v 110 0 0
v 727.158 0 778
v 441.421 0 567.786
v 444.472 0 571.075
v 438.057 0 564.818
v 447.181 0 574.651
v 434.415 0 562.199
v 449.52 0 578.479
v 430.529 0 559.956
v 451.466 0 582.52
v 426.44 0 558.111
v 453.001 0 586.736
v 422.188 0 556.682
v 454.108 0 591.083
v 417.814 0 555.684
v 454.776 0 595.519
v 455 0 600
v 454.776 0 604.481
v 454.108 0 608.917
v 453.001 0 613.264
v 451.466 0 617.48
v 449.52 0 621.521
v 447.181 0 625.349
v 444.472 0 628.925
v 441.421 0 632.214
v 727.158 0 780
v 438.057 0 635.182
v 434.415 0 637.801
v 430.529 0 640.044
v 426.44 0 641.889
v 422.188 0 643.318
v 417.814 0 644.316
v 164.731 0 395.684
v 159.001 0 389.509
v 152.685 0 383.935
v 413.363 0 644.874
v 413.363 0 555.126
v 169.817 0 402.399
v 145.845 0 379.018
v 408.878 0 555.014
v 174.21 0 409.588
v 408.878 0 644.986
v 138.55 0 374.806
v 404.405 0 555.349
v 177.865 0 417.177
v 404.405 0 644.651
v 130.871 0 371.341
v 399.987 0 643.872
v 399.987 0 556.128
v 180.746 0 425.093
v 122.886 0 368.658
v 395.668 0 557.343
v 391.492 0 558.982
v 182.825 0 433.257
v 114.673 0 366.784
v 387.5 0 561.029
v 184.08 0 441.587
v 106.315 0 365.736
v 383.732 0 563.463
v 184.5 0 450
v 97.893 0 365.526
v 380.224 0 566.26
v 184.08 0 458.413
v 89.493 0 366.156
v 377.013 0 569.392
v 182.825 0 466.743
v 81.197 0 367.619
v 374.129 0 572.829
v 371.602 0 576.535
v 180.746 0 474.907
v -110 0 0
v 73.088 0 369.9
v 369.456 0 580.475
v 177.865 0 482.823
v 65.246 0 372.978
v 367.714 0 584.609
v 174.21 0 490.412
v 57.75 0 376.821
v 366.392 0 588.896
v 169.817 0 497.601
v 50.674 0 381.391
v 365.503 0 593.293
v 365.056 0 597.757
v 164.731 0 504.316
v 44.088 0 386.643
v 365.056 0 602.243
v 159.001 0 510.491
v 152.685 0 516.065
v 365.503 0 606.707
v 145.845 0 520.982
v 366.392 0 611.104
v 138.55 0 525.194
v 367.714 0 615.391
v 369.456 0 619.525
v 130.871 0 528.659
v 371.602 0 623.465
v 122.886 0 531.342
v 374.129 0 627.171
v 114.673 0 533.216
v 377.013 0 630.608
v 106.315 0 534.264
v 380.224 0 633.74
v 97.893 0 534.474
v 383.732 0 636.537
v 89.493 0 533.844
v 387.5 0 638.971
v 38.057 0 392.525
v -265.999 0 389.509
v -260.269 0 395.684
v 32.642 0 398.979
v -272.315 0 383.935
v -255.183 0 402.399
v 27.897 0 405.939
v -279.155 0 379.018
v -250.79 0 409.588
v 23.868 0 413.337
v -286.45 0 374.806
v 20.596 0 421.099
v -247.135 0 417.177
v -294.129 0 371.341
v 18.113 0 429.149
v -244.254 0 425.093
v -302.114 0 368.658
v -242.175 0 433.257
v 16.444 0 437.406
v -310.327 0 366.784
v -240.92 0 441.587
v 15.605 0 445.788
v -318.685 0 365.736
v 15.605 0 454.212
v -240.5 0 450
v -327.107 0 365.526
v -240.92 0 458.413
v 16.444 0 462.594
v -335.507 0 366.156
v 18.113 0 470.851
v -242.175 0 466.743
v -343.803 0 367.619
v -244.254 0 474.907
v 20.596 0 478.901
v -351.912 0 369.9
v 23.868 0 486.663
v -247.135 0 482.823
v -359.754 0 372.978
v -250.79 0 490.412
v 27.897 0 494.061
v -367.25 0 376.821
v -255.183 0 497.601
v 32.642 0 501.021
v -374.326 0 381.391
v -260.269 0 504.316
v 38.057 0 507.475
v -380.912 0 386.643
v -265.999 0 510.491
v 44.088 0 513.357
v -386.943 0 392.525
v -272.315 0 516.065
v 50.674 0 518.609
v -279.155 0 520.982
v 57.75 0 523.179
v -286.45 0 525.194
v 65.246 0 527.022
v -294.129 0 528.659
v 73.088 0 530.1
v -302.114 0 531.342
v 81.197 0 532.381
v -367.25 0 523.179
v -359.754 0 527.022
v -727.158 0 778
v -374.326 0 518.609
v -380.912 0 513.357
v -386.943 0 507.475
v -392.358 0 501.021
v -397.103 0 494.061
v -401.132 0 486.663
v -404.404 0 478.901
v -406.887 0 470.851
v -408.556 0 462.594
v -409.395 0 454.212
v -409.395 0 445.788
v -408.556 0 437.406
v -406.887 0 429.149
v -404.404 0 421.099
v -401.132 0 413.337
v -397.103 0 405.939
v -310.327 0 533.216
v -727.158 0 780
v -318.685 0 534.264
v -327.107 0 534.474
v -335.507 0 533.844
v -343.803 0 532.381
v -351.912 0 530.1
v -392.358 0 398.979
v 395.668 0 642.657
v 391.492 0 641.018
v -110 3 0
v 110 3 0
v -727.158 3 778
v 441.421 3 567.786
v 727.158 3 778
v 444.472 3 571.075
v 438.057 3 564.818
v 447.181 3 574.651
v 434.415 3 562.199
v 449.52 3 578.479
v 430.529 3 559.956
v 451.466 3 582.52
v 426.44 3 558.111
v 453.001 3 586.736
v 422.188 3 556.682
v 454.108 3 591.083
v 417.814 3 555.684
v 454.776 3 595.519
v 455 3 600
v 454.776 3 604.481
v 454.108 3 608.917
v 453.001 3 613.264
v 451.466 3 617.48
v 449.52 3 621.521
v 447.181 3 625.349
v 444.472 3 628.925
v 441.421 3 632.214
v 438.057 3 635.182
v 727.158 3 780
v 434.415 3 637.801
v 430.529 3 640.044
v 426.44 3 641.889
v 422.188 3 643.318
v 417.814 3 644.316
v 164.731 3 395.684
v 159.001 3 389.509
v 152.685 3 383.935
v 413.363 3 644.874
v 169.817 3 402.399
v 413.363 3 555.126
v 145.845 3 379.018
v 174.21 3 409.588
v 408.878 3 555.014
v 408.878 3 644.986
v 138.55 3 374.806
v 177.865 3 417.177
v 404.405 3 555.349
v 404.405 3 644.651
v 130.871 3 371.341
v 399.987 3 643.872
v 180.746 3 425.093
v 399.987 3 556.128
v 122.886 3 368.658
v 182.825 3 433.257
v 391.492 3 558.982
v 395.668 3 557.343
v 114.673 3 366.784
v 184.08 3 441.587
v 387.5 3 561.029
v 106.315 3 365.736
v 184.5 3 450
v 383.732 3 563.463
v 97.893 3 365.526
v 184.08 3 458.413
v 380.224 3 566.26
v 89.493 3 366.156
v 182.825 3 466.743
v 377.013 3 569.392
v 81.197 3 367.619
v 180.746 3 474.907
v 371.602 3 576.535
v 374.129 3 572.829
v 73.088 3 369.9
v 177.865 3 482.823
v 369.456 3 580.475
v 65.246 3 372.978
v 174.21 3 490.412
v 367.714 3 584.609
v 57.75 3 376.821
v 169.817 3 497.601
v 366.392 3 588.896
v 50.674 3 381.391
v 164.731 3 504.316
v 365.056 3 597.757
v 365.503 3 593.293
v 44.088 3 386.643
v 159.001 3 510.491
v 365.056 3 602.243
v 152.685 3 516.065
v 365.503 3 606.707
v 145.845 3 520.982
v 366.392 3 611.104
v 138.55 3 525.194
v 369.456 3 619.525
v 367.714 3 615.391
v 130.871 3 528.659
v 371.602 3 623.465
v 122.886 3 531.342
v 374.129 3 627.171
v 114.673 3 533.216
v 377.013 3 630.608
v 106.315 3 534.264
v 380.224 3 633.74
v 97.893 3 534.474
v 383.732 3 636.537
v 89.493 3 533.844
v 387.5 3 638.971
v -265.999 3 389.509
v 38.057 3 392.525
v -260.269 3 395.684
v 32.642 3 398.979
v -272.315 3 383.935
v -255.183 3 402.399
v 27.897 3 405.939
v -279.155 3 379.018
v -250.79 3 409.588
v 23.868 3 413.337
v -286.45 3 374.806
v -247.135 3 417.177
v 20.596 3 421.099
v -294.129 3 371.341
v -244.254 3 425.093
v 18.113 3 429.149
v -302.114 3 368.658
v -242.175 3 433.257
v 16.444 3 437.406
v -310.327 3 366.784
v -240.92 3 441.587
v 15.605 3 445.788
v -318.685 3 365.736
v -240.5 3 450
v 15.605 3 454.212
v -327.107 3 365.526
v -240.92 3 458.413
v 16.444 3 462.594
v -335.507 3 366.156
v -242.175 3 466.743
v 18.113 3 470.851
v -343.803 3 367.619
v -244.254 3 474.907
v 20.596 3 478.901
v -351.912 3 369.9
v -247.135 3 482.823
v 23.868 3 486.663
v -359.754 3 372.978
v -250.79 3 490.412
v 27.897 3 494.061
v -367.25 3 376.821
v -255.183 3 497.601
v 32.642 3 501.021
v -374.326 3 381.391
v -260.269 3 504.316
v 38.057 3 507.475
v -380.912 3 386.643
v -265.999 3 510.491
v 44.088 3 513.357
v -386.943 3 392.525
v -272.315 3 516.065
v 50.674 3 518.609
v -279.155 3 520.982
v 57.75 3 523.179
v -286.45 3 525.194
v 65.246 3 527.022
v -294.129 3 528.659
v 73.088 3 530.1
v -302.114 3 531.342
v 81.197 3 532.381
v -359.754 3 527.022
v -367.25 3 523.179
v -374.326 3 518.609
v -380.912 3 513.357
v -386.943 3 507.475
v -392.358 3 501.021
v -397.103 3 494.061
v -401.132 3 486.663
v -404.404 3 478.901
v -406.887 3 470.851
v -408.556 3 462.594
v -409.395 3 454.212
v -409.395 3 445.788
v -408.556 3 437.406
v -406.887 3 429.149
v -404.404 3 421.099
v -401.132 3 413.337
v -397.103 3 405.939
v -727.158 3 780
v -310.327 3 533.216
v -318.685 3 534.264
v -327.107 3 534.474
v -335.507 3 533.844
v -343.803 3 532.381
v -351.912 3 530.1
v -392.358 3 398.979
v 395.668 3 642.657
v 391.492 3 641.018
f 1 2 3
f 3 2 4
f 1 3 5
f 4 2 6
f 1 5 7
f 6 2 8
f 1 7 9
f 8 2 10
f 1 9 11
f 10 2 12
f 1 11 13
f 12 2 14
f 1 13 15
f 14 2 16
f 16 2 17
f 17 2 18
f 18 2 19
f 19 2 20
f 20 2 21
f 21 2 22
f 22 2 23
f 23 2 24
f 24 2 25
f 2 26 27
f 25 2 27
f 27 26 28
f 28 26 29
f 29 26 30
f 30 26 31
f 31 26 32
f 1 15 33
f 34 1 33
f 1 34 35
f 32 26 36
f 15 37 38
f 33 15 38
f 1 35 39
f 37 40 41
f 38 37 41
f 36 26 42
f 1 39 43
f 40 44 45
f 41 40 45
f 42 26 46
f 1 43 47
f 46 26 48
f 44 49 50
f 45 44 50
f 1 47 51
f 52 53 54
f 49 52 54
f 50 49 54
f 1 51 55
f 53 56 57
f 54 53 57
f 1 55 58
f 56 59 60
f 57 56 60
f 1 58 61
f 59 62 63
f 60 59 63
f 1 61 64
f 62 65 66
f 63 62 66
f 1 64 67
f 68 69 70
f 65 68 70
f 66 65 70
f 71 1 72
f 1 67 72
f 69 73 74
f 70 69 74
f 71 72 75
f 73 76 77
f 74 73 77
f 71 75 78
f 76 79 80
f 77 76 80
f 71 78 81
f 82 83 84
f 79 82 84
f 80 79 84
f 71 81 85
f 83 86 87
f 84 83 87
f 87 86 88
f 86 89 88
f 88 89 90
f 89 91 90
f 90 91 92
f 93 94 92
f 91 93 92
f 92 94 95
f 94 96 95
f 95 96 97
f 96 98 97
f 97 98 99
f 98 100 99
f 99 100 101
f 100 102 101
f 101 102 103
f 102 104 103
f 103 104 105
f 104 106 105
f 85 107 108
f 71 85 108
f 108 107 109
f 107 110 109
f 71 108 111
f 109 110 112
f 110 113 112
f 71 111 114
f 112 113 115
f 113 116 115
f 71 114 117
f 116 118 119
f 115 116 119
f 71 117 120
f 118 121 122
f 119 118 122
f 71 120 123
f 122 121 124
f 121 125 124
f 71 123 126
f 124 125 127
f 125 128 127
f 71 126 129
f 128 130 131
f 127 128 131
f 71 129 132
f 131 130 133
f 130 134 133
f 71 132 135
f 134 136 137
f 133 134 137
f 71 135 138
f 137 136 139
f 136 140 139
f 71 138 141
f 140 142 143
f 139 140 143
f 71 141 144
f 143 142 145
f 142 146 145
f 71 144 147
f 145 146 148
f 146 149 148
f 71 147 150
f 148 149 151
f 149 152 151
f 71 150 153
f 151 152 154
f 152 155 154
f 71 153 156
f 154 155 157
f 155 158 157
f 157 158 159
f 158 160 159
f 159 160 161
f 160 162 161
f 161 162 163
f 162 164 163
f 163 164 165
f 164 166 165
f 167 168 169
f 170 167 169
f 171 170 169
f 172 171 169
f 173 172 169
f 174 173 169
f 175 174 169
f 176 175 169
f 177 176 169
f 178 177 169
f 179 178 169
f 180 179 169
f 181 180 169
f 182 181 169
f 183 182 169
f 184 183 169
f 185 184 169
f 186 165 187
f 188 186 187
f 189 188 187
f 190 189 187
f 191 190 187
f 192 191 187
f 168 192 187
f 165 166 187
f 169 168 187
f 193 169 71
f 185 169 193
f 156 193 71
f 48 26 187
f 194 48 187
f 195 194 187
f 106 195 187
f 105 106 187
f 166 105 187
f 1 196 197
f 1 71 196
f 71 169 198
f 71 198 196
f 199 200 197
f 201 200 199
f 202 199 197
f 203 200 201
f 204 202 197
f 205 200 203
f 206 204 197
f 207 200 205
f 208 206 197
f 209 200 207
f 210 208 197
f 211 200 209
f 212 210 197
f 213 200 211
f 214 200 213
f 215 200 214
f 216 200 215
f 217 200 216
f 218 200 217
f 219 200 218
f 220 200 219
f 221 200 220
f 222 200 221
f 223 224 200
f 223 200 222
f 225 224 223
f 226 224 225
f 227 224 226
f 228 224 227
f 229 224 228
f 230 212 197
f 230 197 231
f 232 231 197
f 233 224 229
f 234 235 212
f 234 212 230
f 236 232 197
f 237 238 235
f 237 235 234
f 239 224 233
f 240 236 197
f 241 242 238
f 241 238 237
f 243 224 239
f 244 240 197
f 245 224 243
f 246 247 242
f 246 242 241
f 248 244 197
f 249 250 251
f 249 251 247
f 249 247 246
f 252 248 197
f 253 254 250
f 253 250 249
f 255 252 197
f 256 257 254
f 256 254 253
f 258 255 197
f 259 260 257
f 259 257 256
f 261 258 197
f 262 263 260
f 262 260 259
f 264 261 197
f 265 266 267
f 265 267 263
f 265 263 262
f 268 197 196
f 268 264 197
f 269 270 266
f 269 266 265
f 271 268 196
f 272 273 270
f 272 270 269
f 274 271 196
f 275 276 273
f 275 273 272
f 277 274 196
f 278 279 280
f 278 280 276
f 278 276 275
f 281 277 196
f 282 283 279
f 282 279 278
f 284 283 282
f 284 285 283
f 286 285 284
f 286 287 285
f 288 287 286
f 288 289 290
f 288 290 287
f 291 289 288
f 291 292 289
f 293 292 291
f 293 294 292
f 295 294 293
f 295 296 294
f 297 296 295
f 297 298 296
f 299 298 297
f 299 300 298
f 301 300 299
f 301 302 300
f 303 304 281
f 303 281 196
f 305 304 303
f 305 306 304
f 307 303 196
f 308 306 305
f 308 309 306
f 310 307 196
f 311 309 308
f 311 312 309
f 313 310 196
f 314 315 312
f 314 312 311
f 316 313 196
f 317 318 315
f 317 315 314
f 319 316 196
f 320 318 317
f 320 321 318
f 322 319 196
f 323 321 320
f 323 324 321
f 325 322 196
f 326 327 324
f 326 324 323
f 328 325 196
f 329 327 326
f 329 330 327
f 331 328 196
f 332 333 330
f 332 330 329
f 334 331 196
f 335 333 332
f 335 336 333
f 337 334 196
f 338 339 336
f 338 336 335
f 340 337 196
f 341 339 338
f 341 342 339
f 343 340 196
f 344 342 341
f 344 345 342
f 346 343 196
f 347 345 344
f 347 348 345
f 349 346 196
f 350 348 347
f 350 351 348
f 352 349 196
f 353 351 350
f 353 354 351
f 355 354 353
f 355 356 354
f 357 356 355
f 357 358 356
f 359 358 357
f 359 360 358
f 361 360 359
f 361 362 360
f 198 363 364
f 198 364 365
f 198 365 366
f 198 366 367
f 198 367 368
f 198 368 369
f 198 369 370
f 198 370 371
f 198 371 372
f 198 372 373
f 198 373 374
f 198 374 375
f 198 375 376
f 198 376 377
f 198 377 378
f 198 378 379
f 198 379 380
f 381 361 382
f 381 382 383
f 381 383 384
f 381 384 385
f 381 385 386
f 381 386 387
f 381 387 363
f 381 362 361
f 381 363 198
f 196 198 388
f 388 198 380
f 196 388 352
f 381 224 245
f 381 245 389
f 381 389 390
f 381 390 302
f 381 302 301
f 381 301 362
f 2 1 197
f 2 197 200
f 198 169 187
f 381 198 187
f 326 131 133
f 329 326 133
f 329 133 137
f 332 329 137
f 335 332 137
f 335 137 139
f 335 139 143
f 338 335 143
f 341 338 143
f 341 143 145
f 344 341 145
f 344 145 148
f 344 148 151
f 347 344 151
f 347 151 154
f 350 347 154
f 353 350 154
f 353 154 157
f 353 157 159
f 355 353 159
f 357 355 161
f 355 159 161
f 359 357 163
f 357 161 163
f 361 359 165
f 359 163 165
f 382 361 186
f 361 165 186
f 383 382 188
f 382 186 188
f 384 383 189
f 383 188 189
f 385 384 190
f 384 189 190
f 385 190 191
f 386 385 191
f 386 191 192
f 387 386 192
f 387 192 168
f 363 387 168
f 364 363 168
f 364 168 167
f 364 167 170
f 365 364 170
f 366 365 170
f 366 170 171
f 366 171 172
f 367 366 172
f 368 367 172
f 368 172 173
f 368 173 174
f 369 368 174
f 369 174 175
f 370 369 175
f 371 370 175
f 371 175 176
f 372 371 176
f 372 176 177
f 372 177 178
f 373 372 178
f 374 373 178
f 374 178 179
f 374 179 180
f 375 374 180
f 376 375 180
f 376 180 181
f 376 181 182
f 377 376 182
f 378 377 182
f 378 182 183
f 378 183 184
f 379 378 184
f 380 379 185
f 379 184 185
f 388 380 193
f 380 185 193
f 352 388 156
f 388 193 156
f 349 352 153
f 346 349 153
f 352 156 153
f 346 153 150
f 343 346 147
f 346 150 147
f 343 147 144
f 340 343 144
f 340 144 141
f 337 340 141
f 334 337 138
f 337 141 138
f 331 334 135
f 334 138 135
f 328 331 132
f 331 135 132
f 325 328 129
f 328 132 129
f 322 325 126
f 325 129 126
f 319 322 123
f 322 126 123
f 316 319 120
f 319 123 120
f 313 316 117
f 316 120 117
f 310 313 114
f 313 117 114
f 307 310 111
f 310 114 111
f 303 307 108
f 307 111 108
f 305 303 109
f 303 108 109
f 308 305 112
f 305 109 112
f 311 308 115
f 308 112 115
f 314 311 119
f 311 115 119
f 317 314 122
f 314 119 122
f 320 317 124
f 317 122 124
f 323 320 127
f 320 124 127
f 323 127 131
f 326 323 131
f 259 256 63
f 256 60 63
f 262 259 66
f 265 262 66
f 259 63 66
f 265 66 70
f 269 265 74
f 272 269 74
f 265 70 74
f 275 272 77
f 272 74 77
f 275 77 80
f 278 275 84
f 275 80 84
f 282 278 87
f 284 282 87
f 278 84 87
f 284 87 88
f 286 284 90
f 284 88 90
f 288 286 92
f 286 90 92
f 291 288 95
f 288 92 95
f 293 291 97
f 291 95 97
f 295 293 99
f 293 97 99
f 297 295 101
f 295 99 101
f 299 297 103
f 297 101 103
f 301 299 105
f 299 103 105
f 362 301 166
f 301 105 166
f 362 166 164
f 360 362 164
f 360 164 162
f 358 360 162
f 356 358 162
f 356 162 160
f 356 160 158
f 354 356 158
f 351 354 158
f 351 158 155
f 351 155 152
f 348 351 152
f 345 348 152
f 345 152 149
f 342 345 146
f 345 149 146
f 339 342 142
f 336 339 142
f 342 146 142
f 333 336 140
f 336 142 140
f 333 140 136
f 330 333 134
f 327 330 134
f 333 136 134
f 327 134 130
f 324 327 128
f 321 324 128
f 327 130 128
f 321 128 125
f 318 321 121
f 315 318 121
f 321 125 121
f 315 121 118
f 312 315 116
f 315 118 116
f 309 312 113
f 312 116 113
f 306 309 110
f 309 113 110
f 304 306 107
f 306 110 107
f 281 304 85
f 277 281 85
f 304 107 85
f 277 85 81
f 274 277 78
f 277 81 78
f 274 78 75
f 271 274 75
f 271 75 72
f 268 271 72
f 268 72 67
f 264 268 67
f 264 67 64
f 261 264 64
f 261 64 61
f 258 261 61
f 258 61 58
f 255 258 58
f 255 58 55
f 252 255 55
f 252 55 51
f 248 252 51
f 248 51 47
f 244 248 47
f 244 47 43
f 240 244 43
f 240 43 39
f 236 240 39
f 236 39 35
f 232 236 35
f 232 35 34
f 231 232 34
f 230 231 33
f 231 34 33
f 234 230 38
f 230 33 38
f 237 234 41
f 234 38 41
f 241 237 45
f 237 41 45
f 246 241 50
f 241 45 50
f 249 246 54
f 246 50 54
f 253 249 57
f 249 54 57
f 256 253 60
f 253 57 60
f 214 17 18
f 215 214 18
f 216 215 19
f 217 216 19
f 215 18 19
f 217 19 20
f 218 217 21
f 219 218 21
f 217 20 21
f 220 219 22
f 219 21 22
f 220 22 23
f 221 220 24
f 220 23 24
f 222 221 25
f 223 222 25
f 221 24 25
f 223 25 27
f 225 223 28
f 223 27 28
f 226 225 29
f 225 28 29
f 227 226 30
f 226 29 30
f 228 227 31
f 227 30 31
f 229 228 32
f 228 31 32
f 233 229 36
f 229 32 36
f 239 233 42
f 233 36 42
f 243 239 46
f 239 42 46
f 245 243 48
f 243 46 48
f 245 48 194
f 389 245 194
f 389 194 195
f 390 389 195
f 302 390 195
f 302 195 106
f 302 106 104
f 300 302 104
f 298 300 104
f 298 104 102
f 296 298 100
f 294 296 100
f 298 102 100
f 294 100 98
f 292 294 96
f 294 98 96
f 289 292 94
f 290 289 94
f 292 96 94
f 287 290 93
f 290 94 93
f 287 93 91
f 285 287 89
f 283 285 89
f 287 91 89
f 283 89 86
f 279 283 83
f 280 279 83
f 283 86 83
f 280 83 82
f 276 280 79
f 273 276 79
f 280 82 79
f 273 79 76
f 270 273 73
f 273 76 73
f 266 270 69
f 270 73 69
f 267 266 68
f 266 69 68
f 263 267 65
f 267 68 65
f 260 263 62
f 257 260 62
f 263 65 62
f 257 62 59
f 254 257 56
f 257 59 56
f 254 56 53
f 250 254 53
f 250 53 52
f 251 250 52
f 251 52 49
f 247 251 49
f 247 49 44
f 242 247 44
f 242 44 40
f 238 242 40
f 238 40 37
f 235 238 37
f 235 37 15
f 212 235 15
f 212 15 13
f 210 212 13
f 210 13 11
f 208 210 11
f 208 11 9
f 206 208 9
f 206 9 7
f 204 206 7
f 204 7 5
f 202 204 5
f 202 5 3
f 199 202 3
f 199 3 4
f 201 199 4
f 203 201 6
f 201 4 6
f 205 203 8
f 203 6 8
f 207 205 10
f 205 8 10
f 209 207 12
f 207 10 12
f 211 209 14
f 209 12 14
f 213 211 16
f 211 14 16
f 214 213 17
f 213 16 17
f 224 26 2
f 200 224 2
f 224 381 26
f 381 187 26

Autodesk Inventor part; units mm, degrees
ref_plane "YZ Plane" through (0, 0, 0) normal (1, 0, 0) x (0, 1, 0)
ref_plane "XZ Plane" through (0, 0, 0) normal (0, 1, 0) x (-1, 0, 0)
ref_plane "XY Plane" through (0, 0, 0) normal (0, 0, 1) x (1, 0, 0)
sketch "Sketch1" plane through (0, 0, 0) normal (0, 1, 0) x (-1, 0, 0)
  line L0 (0, 780) -> (0, 0)
  line L1 (727.158, 778) -> (727.158, 780)
  line L2 (727.158, 780) -> (0, 780)
  line L3 (727.158, 778) -> (110, 0)
  line L4 (110, 0) -> (0, 0)
  point P0 (0, 678)
  dimension "d1" = 727.158
  dimension "d2" = 2
  dimension "d5" = 128.424
  dimension "d6" = 110
  dimension "d9" = 780
extrude "Plate1" add sketch "Sketch1" along normal blind 3
mirror "Mirror1" about plane through (0, 0, 0) normal (1, 0, 0)
sketch "Sketch2" plane through (0, 0, 0) normal (0, -1, 0) x (1, 0, 0)
  line L0 (-110, 0) -> (110, 0) construction
  line L1 (-110, 0) -> (-727.158, 778) construction
  circle A0 centre (-325, 450) radius 84.5
  line L2 (110, 0) -> (727.158, 778) construction
  circle A1 centre (100, 450) radius 84.5
  circle A2 centre (410, 600) radius 45
  line L3 (-110, 0) -> (110, 0) construction
  line L4 (-240.5, 450) -> (-240.5, 164.5105) construction
  line L5 (365, 600) -> (365, 0) construction
  line L6 (-325, 534.5) -> (365, 534.5) construction
  line L7 (-325, 365.5) -> (365, 365.5) construction
  line L8 (100, 534.5) -> (365, 534.5) construction
  line L9 (410, 555) -> (365, 555) construction
  line L10 (-727.158, 780) -> (727.158, 780) projected
  line L11 (-727.158, 778) -> (-727.158, 780) projected
  line L12 (727.158, 778) -> (727.158, 780) projected
  point P0 (0, 0)
  point P1 (0, 0)
  point P2 (0, 0)
  point P3 (0, 0)
  point P4 (0, 0)
  point P5 (0, 0)
  point P6 (0, 0)
  dimension "d13" = 169
  dimension "d16" = 450
  dimension "d17" = 450
  dimension "d18" = 325
  dimension "d19" = -169
  dimension "d20" = 90
  dimension "d23" = 410
  dimension "d24" = 600
  dimension "d29" = 100
extrude "Extrusion1" cut sketch "Sketch2" against normal through all
sketch "Sketch3" plane through (0, 0, 0) normal (0, -1, 0) x (1, 0, 0)
  line L0 (-53.9958, 701.8167) -> (-53.9958, 713.8167) construction
  line L1 (-53.9958, 713.8167) -> (56.0042, 713.8167) construction
  line L2 (56.0042, 713.8167) -> (56.0042, 701.8167) construction
  line L3 (56.0042, 701.8167) -> (-53.9958, 701.8167) construction
  point P0 (0, 0)
  point P1 (1.0042, 701.8167)
  dimension "d25" = 12
  dimension "d26" = 110
mark "Mark1"
equation "\"d3\" = Thickness"
equation "\"Thickness\" = 3"
properties part number "MSC 701 FACE 1" material "Stainless Steel"
